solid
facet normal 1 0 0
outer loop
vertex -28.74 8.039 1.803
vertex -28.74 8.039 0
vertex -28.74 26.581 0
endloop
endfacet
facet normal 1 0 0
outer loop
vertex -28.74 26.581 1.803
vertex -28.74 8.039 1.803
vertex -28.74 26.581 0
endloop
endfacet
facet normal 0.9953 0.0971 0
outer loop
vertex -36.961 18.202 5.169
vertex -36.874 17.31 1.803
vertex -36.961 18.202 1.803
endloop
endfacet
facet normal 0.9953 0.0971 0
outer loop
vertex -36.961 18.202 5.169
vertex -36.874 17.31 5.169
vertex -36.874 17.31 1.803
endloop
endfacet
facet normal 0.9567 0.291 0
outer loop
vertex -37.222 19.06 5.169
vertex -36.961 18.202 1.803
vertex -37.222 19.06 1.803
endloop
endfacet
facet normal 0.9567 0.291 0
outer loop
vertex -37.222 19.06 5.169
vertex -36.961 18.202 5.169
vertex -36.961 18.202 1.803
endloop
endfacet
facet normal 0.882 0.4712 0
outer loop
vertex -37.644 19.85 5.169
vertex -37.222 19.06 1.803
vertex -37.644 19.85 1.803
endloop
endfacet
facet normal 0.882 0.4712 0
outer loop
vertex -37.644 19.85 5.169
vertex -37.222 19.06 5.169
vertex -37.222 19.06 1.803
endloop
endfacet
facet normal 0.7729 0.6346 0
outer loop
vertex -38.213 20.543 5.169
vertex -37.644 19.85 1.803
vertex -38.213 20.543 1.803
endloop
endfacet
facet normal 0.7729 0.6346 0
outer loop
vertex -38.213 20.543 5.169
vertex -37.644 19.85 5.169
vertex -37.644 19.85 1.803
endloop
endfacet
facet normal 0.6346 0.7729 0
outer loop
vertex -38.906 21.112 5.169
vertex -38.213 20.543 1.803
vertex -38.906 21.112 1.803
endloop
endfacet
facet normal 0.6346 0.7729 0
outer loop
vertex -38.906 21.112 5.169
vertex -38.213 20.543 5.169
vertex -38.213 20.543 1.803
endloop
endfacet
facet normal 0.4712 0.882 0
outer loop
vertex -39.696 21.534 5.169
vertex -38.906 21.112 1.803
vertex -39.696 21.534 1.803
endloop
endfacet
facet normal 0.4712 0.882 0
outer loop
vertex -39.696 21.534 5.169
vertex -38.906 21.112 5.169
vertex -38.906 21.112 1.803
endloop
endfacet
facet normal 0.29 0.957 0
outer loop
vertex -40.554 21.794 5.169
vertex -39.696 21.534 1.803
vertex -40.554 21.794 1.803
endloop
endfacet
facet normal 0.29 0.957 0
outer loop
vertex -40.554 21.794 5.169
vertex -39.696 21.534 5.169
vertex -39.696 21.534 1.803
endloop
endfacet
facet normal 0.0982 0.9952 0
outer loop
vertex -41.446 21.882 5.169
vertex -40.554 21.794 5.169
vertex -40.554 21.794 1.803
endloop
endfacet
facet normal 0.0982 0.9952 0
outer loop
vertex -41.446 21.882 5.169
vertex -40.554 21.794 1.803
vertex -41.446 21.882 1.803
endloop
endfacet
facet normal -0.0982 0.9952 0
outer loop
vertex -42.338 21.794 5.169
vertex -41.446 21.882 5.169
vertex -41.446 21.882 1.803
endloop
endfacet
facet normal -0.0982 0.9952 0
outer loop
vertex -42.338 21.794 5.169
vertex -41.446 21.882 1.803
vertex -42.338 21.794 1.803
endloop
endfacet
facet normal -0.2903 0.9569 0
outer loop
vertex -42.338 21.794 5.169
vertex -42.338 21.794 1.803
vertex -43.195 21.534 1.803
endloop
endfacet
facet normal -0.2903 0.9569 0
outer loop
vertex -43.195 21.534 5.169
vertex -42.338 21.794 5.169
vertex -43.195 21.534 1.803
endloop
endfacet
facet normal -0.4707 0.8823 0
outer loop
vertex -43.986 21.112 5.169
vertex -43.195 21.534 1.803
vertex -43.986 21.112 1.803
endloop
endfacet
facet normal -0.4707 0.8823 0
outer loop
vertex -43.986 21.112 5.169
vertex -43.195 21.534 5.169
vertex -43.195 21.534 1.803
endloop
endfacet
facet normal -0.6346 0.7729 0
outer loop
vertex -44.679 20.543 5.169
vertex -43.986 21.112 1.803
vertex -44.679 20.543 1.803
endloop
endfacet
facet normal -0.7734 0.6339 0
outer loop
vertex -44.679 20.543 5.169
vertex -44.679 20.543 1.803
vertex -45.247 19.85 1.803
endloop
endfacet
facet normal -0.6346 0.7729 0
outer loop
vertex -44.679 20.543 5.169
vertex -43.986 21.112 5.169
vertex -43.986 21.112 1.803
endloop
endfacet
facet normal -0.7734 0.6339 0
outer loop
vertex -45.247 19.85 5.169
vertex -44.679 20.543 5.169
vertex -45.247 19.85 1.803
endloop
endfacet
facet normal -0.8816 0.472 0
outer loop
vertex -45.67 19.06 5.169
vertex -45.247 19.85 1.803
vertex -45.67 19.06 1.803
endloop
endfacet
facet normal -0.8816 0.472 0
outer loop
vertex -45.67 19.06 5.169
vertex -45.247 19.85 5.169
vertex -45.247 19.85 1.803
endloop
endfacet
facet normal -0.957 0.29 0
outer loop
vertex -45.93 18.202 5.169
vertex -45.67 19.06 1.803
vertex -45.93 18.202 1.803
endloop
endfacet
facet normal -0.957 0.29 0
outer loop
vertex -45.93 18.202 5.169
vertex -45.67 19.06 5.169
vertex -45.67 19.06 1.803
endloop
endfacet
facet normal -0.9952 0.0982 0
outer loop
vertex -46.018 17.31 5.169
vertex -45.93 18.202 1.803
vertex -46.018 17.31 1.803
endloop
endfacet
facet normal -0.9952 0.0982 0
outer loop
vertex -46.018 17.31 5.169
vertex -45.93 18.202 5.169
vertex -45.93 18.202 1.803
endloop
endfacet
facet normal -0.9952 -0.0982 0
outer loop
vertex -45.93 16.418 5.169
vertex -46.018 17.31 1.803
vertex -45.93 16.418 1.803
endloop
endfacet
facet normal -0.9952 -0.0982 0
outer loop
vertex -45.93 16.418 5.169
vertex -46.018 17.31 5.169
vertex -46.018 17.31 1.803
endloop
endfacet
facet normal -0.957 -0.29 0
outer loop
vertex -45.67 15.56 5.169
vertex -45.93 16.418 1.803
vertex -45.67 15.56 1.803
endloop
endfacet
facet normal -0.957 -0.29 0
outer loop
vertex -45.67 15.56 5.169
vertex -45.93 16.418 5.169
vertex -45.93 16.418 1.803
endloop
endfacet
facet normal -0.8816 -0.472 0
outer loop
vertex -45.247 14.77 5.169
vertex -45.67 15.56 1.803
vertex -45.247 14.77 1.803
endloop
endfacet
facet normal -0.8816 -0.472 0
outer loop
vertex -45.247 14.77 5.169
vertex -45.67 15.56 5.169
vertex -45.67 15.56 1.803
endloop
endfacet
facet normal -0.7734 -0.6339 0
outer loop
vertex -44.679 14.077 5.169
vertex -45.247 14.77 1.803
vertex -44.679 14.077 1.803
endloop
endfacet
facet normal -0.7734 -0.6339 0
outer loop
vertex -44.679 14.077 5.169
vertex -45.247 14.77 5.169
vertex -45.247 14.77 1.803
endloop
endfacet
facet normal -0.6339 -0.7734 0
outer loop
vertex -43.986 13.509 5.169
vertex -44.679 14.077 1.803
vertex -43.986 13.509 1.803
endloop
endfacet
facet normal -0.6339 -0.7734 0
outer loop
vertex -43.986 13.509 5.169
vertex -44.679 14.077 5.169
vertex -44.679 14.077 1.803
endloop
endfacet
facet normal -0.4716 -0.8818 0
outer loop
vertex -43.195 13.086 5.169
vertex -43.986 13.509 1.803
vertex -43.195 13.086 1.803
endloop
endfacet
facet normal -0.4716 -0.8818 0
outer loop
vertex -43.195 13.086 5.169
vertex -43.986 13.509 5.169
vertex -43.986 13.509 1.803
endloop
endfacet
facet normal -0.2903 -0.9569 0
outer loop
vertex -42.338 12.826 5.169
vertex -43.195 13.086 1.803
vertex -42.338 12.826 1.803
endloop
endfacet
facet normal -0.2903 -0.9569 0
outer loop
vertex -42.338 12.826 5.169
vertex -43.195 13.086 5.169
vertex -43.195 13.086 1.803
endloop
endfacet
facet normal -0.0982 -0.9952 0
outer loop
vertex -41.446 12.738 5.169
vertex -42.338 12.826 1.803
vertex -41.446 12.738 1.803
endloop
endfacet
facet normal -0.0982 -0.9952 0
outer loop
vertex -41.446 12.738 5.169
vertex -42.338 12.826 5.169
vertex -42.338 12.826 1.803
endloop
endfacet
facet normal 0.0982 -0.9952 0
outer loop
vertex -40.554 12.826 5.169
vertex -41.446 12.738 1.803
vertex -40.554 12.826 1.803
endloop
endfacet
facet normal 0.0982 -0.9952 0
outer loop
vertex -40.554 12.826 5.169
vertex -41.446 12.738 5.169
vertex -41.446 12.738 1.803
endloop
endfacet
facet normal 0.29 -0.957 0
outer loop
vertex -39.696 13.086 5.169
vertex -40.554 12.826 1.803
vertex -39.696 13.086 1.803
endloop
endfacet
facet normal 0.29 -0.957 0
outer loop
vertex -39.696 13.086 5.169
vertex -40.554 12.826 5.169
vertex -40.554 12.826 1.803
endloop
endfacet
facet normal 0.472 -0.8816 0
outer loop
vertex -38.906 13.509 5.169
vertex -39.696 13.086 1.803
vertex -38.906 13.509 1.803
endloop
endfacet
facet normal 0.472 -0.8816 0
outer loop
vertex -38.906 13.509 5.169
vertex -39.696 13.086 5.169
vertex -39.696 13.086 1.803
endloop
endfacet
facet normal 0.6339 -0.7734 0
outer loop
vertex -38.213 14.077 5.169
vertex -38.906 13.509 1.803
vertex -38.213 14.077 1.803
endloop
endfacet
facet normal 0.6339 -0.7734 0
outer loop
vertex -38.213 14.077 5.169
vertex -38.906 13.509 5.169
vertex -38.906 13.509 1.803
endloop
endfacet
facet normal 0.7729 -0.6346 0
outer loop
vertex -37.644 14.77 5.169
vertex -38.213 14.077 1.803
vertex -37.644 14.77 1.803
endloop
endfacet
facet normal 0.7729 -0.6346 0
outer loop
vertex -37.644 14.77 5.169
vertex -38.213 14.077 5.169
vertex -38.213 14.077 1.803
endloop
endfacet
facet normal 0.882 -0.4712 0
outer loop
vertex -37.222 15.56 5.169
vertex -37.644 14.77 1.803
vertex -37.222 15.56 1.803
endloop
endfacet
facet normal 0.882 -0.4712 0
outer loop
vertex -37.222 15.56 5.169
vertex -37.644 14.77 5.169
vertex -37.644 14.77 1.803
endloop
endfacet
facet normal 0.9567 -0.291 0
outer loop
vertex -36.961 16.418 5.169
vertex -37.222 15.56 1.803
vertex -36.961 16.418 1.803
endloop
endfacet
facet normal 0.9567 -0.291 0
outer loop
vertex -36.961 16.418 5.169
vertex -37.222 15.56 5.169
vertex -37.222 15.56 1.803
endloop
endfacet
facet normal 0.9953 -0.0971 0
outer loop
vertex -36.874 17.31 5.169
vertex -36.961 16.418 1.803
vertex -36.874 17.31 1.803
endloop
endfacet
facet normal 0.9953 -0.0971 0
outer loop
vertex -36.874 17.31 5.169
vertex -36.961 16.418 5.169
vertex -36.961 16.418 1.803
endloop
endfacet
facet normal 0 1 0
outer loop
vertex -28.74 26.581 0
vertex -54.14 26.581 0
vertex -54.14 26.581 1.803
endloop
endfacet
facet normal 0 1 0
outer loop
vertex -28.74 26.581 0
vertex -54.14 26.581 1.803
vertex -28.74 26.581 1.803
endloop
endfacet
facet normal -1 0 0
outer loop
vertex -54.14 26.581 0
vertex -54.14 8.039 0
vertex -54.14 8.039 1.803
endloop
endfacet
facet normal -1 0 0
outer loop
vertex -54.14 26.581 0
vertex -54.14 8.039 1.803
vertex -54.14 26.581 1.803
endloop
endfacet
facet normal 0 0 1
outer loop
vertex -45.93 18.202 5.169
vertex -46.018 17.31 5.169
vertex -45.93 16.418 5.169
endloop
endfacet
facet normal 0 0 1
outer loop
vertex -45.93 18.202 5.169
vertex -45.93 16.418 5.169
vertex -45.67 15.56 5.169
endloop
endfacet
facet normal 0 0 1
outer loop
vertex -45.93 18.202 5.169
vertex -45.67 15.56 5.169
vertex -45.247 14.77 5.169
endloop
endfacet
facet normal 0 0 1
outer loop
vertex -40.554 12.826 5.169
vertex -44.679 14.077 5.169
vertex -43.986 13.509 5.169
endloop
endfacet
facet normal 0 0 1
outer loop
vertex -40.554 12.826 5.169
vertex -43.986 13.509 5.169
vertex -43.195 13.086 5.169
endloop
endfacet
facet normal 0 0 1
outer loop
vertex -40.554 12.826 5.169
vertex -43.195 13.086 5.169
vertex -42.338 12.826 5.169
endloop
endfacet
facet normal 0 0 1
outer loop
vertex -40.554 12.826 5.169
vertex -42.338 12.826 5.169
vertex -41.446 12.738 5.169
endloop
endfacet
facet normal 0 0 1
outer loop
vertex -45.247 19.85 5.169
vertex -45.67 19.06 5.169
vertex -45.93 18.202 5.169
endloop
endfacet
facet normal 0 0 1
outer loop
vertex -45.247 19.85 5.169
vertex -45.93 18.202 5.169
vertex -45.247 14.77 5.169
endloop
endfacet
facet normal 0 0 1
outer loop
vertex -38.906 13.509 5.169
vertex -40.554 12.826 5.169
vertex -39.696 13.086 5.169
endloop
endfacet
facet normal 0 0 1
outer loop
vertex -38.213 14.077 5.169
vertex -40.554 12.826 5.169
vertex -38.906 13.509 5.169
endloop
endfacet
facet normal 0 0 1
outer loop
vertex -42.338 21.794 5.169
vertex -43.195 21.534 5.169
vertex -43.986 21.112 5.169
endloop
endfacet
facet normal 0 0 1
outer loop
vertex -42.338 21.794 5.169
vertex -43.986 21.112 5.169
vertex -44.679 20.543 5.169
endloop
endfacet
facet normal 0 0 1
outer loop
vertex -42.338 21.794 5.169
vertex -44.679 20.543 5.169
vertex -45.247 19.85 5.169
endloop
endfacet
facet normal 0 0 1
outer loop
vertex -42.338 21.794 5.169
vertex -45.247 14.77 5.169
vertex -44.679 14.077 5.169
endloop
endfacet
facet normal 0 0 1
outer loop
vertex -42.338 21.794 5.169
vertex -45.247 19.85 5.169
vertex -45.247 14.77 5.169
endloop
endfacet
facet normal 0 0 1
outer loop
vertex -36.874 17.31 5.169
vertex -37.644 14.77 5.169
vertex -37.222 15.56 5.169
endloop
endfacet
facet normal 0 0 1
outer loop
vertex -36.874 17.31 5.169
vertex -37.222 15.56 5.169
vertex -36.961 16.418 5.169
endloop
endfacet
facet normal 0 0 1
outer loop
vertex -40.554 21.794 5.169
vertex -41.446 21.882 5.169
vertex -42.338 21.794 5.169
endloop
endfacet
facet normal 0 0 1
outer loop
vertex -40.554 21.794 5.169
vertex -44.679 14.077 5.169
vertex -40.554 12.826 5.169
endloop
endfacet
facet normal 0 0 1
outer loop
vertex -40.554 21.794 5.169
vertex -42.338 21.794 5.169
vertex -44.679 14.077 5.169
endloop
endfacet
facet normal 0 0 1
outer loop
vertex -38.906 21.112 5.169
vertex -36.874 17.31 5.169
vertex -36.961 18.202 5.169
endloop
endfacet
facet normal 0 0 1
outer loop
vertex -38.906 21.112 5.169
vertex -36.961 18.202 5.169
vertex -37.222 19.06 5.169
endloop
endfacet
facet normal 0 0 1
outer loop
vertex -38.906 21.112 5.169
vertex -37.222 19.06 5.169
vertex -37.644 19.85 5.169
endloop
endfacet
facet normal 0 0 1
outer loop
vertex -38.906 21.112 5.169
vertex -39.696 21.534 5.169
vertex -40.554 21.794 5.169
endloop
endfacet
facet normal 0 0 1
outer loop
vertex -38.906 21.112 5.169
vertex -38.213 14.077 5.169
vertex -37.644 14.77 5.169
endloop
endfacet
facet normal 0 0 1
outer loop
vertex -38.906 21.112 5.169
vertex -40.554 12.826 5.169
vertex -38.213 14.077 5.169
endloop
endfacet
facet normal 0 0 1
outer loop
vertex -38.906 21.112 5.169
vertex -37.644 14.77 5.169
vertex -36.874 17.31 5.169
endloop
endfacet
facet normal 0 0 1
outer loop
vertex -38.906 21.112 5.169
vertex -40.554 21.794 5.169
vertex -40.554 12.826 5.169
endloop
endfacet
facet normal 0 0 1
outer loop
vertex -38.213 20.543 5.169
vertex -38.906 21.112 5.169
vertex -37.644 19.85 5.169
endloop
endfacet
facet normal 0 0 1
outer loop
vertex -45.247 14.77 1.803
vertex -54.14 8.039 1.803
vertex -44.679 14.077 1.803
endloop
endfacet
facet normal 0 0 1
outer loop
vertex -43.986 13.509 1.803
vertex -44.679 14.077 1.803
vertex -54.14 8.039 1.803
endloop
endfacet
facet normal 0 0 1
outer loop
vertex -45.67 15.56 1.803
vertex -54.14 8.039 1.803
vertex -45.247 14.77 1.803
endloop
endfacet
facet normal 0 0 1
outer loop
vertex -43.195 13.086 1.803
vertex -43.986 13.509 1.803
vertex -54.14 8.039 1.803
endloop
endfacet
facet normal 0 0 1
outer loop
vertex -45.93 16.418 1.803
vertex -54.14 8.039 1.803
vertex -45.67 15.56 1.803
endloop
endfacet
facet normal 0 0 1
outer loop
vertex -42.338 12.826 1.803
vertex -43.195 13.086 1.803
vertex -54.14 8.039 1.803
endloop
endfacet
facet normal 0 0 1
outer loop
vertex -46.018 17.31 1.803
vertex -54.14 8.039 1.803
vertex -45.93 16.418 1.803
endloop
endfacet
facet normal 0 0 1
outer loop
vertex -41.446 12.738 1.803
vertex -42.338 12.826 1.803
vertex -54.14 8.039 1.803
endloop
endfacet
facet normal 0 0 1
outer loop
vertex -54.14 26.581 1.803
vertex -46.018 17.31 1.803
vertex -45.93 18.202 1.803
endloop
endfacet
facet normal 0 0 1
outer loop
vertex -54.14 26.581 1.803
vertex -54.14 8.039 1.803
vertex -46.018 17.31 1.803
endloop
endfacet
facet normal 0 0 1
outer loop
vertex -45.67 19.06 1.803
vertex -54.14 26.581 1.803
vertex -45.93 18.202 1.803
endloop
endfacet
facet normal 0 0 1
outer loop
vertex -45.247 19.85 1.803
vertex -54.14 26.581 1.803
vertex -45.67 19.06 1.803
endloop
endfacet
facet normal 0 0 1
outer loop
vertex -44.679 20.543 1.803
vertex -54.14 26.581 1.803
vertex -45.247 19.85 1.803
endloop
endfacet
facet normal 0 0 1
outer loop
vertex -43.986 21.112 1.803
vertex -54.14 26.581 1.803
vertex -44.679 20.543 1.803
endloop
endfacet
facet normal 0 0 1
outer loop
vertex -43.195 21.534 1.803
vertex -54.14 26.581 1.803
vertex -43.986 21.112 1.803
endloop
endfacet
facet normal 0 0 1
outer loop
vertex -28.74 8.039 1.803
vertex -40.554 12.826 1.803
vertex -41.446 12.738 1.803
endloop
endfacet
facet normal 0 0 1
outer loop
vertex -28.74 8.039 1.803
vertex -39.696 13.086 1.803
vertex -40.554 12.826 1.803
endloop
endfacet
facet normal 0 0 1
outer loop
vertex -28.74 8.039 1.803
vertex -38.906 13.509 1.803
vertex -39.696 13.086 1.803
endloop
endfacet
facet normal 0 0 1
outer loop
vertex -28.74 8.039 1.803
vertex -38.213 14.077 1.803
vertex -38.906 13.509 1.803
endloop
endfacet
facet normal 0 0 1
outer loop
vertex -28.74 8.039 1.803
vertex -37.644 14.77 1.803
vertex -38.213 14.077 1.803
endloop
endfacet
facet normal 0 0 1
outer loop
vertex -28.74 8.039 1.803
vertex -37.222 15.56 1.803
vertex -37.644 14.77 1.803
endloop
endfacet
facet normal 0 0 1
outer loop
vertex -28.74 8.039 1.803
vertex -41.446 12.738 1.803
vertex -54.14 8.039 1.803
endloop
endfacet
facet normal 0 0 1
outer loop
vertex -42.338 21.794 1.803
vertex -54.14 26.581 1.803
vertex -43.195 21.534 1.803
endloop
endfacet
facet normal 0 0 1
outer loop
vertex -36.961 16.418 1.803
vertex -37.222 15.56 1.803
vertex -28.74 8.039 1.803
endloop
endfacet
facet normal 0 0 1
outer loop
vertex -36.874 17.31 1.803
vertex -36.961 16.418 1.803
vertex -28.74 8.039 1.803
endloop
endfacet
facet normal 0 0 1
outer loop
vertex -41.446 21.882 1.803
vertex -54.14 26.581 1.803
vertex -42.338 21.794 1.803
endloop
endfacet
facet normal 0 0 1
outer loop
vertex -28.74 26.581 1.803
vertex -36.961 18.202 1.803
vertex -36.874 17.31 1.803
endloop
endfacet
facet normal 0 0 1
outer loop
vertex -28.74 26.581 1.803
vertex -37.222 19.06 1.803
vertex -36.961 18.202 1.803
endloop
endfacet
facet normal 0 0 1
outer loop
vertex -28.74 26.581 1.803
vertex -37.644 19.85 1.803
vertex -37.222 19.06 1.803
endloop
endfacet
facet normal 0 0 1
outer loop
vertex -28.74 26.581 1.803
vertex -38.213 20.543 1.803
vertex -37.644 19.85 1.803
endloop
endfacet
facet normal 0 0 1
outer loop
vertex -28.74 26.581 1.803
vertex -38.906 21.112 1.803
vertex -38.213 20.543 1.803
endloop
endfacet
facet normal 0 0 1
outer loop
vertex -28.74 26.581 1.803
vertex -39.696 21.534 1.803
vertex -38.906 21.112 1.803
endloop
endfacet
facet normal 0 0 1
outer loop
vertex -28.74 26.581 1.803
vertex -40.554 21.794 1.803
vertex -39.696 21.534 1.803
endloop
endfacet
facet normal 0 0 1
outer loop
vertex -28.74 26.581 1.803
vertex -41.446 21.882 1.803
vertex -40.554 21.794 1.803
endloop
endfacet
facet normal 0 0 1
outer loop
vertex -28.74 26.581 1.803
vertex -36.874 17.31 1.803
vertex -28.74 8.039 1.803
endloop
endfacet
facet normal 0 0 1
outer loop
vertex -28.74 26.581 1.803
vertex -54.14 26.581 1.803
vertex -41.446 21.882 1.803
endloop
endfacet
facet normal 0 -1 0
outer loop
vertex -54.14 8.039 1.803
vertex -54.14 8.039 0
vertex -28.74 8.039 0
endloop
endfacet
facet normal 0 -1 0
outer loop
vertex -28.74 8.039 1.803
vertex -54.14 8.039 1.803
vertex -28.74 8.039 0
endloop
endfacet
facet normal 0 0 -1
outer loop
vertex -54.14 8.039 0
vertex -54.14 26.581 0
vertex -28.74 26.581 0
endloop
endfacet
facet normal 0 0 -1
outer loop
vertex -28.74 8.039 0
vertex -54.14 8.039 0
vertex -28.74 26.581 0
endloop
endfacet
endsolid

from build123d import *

# Parameters (mm, degrees)
F0_W      = 25.4
F0_H      = 18.542
F1_DEPTH  = 1.8034
F2_R      = 4.572
F3_DEPTH  = 3.3655
F3_FACE_R = 4.572
F4_DEPTH  = 1.5621


with BuildPart() as f1:
    # F0 (on Top) → F1 (new body)
    with BuildSketch(Plane.XY):
        with Locations((-41.440347, 17.31006)):
            Rectangle(F0_W, F0_H)
    extrude(amount=F1_DEPTH)

    # F2 (on face) → F3 (join, symmetric)
    with BuildSketch(Plane.XY.offset(1.8034)):
        with Locations((-41.445623, 17.31006)):
            Circle(F2_R)
    extrude(amount=F3_DEPTH, both=True)

    # F3_face (on face) → F4 (cut, through all)
    with BuildSketch(Plane(origin=(-41.445623, 17.31006, -1.5621), x_dir=(1, 0, 0), z_dir=(0, 0, -1))):
        Circle(F3_FACE_R)
    extrude(amount=-F4_DEPTH, mode=Mode.SUBTRACT)


solid = f1.part
